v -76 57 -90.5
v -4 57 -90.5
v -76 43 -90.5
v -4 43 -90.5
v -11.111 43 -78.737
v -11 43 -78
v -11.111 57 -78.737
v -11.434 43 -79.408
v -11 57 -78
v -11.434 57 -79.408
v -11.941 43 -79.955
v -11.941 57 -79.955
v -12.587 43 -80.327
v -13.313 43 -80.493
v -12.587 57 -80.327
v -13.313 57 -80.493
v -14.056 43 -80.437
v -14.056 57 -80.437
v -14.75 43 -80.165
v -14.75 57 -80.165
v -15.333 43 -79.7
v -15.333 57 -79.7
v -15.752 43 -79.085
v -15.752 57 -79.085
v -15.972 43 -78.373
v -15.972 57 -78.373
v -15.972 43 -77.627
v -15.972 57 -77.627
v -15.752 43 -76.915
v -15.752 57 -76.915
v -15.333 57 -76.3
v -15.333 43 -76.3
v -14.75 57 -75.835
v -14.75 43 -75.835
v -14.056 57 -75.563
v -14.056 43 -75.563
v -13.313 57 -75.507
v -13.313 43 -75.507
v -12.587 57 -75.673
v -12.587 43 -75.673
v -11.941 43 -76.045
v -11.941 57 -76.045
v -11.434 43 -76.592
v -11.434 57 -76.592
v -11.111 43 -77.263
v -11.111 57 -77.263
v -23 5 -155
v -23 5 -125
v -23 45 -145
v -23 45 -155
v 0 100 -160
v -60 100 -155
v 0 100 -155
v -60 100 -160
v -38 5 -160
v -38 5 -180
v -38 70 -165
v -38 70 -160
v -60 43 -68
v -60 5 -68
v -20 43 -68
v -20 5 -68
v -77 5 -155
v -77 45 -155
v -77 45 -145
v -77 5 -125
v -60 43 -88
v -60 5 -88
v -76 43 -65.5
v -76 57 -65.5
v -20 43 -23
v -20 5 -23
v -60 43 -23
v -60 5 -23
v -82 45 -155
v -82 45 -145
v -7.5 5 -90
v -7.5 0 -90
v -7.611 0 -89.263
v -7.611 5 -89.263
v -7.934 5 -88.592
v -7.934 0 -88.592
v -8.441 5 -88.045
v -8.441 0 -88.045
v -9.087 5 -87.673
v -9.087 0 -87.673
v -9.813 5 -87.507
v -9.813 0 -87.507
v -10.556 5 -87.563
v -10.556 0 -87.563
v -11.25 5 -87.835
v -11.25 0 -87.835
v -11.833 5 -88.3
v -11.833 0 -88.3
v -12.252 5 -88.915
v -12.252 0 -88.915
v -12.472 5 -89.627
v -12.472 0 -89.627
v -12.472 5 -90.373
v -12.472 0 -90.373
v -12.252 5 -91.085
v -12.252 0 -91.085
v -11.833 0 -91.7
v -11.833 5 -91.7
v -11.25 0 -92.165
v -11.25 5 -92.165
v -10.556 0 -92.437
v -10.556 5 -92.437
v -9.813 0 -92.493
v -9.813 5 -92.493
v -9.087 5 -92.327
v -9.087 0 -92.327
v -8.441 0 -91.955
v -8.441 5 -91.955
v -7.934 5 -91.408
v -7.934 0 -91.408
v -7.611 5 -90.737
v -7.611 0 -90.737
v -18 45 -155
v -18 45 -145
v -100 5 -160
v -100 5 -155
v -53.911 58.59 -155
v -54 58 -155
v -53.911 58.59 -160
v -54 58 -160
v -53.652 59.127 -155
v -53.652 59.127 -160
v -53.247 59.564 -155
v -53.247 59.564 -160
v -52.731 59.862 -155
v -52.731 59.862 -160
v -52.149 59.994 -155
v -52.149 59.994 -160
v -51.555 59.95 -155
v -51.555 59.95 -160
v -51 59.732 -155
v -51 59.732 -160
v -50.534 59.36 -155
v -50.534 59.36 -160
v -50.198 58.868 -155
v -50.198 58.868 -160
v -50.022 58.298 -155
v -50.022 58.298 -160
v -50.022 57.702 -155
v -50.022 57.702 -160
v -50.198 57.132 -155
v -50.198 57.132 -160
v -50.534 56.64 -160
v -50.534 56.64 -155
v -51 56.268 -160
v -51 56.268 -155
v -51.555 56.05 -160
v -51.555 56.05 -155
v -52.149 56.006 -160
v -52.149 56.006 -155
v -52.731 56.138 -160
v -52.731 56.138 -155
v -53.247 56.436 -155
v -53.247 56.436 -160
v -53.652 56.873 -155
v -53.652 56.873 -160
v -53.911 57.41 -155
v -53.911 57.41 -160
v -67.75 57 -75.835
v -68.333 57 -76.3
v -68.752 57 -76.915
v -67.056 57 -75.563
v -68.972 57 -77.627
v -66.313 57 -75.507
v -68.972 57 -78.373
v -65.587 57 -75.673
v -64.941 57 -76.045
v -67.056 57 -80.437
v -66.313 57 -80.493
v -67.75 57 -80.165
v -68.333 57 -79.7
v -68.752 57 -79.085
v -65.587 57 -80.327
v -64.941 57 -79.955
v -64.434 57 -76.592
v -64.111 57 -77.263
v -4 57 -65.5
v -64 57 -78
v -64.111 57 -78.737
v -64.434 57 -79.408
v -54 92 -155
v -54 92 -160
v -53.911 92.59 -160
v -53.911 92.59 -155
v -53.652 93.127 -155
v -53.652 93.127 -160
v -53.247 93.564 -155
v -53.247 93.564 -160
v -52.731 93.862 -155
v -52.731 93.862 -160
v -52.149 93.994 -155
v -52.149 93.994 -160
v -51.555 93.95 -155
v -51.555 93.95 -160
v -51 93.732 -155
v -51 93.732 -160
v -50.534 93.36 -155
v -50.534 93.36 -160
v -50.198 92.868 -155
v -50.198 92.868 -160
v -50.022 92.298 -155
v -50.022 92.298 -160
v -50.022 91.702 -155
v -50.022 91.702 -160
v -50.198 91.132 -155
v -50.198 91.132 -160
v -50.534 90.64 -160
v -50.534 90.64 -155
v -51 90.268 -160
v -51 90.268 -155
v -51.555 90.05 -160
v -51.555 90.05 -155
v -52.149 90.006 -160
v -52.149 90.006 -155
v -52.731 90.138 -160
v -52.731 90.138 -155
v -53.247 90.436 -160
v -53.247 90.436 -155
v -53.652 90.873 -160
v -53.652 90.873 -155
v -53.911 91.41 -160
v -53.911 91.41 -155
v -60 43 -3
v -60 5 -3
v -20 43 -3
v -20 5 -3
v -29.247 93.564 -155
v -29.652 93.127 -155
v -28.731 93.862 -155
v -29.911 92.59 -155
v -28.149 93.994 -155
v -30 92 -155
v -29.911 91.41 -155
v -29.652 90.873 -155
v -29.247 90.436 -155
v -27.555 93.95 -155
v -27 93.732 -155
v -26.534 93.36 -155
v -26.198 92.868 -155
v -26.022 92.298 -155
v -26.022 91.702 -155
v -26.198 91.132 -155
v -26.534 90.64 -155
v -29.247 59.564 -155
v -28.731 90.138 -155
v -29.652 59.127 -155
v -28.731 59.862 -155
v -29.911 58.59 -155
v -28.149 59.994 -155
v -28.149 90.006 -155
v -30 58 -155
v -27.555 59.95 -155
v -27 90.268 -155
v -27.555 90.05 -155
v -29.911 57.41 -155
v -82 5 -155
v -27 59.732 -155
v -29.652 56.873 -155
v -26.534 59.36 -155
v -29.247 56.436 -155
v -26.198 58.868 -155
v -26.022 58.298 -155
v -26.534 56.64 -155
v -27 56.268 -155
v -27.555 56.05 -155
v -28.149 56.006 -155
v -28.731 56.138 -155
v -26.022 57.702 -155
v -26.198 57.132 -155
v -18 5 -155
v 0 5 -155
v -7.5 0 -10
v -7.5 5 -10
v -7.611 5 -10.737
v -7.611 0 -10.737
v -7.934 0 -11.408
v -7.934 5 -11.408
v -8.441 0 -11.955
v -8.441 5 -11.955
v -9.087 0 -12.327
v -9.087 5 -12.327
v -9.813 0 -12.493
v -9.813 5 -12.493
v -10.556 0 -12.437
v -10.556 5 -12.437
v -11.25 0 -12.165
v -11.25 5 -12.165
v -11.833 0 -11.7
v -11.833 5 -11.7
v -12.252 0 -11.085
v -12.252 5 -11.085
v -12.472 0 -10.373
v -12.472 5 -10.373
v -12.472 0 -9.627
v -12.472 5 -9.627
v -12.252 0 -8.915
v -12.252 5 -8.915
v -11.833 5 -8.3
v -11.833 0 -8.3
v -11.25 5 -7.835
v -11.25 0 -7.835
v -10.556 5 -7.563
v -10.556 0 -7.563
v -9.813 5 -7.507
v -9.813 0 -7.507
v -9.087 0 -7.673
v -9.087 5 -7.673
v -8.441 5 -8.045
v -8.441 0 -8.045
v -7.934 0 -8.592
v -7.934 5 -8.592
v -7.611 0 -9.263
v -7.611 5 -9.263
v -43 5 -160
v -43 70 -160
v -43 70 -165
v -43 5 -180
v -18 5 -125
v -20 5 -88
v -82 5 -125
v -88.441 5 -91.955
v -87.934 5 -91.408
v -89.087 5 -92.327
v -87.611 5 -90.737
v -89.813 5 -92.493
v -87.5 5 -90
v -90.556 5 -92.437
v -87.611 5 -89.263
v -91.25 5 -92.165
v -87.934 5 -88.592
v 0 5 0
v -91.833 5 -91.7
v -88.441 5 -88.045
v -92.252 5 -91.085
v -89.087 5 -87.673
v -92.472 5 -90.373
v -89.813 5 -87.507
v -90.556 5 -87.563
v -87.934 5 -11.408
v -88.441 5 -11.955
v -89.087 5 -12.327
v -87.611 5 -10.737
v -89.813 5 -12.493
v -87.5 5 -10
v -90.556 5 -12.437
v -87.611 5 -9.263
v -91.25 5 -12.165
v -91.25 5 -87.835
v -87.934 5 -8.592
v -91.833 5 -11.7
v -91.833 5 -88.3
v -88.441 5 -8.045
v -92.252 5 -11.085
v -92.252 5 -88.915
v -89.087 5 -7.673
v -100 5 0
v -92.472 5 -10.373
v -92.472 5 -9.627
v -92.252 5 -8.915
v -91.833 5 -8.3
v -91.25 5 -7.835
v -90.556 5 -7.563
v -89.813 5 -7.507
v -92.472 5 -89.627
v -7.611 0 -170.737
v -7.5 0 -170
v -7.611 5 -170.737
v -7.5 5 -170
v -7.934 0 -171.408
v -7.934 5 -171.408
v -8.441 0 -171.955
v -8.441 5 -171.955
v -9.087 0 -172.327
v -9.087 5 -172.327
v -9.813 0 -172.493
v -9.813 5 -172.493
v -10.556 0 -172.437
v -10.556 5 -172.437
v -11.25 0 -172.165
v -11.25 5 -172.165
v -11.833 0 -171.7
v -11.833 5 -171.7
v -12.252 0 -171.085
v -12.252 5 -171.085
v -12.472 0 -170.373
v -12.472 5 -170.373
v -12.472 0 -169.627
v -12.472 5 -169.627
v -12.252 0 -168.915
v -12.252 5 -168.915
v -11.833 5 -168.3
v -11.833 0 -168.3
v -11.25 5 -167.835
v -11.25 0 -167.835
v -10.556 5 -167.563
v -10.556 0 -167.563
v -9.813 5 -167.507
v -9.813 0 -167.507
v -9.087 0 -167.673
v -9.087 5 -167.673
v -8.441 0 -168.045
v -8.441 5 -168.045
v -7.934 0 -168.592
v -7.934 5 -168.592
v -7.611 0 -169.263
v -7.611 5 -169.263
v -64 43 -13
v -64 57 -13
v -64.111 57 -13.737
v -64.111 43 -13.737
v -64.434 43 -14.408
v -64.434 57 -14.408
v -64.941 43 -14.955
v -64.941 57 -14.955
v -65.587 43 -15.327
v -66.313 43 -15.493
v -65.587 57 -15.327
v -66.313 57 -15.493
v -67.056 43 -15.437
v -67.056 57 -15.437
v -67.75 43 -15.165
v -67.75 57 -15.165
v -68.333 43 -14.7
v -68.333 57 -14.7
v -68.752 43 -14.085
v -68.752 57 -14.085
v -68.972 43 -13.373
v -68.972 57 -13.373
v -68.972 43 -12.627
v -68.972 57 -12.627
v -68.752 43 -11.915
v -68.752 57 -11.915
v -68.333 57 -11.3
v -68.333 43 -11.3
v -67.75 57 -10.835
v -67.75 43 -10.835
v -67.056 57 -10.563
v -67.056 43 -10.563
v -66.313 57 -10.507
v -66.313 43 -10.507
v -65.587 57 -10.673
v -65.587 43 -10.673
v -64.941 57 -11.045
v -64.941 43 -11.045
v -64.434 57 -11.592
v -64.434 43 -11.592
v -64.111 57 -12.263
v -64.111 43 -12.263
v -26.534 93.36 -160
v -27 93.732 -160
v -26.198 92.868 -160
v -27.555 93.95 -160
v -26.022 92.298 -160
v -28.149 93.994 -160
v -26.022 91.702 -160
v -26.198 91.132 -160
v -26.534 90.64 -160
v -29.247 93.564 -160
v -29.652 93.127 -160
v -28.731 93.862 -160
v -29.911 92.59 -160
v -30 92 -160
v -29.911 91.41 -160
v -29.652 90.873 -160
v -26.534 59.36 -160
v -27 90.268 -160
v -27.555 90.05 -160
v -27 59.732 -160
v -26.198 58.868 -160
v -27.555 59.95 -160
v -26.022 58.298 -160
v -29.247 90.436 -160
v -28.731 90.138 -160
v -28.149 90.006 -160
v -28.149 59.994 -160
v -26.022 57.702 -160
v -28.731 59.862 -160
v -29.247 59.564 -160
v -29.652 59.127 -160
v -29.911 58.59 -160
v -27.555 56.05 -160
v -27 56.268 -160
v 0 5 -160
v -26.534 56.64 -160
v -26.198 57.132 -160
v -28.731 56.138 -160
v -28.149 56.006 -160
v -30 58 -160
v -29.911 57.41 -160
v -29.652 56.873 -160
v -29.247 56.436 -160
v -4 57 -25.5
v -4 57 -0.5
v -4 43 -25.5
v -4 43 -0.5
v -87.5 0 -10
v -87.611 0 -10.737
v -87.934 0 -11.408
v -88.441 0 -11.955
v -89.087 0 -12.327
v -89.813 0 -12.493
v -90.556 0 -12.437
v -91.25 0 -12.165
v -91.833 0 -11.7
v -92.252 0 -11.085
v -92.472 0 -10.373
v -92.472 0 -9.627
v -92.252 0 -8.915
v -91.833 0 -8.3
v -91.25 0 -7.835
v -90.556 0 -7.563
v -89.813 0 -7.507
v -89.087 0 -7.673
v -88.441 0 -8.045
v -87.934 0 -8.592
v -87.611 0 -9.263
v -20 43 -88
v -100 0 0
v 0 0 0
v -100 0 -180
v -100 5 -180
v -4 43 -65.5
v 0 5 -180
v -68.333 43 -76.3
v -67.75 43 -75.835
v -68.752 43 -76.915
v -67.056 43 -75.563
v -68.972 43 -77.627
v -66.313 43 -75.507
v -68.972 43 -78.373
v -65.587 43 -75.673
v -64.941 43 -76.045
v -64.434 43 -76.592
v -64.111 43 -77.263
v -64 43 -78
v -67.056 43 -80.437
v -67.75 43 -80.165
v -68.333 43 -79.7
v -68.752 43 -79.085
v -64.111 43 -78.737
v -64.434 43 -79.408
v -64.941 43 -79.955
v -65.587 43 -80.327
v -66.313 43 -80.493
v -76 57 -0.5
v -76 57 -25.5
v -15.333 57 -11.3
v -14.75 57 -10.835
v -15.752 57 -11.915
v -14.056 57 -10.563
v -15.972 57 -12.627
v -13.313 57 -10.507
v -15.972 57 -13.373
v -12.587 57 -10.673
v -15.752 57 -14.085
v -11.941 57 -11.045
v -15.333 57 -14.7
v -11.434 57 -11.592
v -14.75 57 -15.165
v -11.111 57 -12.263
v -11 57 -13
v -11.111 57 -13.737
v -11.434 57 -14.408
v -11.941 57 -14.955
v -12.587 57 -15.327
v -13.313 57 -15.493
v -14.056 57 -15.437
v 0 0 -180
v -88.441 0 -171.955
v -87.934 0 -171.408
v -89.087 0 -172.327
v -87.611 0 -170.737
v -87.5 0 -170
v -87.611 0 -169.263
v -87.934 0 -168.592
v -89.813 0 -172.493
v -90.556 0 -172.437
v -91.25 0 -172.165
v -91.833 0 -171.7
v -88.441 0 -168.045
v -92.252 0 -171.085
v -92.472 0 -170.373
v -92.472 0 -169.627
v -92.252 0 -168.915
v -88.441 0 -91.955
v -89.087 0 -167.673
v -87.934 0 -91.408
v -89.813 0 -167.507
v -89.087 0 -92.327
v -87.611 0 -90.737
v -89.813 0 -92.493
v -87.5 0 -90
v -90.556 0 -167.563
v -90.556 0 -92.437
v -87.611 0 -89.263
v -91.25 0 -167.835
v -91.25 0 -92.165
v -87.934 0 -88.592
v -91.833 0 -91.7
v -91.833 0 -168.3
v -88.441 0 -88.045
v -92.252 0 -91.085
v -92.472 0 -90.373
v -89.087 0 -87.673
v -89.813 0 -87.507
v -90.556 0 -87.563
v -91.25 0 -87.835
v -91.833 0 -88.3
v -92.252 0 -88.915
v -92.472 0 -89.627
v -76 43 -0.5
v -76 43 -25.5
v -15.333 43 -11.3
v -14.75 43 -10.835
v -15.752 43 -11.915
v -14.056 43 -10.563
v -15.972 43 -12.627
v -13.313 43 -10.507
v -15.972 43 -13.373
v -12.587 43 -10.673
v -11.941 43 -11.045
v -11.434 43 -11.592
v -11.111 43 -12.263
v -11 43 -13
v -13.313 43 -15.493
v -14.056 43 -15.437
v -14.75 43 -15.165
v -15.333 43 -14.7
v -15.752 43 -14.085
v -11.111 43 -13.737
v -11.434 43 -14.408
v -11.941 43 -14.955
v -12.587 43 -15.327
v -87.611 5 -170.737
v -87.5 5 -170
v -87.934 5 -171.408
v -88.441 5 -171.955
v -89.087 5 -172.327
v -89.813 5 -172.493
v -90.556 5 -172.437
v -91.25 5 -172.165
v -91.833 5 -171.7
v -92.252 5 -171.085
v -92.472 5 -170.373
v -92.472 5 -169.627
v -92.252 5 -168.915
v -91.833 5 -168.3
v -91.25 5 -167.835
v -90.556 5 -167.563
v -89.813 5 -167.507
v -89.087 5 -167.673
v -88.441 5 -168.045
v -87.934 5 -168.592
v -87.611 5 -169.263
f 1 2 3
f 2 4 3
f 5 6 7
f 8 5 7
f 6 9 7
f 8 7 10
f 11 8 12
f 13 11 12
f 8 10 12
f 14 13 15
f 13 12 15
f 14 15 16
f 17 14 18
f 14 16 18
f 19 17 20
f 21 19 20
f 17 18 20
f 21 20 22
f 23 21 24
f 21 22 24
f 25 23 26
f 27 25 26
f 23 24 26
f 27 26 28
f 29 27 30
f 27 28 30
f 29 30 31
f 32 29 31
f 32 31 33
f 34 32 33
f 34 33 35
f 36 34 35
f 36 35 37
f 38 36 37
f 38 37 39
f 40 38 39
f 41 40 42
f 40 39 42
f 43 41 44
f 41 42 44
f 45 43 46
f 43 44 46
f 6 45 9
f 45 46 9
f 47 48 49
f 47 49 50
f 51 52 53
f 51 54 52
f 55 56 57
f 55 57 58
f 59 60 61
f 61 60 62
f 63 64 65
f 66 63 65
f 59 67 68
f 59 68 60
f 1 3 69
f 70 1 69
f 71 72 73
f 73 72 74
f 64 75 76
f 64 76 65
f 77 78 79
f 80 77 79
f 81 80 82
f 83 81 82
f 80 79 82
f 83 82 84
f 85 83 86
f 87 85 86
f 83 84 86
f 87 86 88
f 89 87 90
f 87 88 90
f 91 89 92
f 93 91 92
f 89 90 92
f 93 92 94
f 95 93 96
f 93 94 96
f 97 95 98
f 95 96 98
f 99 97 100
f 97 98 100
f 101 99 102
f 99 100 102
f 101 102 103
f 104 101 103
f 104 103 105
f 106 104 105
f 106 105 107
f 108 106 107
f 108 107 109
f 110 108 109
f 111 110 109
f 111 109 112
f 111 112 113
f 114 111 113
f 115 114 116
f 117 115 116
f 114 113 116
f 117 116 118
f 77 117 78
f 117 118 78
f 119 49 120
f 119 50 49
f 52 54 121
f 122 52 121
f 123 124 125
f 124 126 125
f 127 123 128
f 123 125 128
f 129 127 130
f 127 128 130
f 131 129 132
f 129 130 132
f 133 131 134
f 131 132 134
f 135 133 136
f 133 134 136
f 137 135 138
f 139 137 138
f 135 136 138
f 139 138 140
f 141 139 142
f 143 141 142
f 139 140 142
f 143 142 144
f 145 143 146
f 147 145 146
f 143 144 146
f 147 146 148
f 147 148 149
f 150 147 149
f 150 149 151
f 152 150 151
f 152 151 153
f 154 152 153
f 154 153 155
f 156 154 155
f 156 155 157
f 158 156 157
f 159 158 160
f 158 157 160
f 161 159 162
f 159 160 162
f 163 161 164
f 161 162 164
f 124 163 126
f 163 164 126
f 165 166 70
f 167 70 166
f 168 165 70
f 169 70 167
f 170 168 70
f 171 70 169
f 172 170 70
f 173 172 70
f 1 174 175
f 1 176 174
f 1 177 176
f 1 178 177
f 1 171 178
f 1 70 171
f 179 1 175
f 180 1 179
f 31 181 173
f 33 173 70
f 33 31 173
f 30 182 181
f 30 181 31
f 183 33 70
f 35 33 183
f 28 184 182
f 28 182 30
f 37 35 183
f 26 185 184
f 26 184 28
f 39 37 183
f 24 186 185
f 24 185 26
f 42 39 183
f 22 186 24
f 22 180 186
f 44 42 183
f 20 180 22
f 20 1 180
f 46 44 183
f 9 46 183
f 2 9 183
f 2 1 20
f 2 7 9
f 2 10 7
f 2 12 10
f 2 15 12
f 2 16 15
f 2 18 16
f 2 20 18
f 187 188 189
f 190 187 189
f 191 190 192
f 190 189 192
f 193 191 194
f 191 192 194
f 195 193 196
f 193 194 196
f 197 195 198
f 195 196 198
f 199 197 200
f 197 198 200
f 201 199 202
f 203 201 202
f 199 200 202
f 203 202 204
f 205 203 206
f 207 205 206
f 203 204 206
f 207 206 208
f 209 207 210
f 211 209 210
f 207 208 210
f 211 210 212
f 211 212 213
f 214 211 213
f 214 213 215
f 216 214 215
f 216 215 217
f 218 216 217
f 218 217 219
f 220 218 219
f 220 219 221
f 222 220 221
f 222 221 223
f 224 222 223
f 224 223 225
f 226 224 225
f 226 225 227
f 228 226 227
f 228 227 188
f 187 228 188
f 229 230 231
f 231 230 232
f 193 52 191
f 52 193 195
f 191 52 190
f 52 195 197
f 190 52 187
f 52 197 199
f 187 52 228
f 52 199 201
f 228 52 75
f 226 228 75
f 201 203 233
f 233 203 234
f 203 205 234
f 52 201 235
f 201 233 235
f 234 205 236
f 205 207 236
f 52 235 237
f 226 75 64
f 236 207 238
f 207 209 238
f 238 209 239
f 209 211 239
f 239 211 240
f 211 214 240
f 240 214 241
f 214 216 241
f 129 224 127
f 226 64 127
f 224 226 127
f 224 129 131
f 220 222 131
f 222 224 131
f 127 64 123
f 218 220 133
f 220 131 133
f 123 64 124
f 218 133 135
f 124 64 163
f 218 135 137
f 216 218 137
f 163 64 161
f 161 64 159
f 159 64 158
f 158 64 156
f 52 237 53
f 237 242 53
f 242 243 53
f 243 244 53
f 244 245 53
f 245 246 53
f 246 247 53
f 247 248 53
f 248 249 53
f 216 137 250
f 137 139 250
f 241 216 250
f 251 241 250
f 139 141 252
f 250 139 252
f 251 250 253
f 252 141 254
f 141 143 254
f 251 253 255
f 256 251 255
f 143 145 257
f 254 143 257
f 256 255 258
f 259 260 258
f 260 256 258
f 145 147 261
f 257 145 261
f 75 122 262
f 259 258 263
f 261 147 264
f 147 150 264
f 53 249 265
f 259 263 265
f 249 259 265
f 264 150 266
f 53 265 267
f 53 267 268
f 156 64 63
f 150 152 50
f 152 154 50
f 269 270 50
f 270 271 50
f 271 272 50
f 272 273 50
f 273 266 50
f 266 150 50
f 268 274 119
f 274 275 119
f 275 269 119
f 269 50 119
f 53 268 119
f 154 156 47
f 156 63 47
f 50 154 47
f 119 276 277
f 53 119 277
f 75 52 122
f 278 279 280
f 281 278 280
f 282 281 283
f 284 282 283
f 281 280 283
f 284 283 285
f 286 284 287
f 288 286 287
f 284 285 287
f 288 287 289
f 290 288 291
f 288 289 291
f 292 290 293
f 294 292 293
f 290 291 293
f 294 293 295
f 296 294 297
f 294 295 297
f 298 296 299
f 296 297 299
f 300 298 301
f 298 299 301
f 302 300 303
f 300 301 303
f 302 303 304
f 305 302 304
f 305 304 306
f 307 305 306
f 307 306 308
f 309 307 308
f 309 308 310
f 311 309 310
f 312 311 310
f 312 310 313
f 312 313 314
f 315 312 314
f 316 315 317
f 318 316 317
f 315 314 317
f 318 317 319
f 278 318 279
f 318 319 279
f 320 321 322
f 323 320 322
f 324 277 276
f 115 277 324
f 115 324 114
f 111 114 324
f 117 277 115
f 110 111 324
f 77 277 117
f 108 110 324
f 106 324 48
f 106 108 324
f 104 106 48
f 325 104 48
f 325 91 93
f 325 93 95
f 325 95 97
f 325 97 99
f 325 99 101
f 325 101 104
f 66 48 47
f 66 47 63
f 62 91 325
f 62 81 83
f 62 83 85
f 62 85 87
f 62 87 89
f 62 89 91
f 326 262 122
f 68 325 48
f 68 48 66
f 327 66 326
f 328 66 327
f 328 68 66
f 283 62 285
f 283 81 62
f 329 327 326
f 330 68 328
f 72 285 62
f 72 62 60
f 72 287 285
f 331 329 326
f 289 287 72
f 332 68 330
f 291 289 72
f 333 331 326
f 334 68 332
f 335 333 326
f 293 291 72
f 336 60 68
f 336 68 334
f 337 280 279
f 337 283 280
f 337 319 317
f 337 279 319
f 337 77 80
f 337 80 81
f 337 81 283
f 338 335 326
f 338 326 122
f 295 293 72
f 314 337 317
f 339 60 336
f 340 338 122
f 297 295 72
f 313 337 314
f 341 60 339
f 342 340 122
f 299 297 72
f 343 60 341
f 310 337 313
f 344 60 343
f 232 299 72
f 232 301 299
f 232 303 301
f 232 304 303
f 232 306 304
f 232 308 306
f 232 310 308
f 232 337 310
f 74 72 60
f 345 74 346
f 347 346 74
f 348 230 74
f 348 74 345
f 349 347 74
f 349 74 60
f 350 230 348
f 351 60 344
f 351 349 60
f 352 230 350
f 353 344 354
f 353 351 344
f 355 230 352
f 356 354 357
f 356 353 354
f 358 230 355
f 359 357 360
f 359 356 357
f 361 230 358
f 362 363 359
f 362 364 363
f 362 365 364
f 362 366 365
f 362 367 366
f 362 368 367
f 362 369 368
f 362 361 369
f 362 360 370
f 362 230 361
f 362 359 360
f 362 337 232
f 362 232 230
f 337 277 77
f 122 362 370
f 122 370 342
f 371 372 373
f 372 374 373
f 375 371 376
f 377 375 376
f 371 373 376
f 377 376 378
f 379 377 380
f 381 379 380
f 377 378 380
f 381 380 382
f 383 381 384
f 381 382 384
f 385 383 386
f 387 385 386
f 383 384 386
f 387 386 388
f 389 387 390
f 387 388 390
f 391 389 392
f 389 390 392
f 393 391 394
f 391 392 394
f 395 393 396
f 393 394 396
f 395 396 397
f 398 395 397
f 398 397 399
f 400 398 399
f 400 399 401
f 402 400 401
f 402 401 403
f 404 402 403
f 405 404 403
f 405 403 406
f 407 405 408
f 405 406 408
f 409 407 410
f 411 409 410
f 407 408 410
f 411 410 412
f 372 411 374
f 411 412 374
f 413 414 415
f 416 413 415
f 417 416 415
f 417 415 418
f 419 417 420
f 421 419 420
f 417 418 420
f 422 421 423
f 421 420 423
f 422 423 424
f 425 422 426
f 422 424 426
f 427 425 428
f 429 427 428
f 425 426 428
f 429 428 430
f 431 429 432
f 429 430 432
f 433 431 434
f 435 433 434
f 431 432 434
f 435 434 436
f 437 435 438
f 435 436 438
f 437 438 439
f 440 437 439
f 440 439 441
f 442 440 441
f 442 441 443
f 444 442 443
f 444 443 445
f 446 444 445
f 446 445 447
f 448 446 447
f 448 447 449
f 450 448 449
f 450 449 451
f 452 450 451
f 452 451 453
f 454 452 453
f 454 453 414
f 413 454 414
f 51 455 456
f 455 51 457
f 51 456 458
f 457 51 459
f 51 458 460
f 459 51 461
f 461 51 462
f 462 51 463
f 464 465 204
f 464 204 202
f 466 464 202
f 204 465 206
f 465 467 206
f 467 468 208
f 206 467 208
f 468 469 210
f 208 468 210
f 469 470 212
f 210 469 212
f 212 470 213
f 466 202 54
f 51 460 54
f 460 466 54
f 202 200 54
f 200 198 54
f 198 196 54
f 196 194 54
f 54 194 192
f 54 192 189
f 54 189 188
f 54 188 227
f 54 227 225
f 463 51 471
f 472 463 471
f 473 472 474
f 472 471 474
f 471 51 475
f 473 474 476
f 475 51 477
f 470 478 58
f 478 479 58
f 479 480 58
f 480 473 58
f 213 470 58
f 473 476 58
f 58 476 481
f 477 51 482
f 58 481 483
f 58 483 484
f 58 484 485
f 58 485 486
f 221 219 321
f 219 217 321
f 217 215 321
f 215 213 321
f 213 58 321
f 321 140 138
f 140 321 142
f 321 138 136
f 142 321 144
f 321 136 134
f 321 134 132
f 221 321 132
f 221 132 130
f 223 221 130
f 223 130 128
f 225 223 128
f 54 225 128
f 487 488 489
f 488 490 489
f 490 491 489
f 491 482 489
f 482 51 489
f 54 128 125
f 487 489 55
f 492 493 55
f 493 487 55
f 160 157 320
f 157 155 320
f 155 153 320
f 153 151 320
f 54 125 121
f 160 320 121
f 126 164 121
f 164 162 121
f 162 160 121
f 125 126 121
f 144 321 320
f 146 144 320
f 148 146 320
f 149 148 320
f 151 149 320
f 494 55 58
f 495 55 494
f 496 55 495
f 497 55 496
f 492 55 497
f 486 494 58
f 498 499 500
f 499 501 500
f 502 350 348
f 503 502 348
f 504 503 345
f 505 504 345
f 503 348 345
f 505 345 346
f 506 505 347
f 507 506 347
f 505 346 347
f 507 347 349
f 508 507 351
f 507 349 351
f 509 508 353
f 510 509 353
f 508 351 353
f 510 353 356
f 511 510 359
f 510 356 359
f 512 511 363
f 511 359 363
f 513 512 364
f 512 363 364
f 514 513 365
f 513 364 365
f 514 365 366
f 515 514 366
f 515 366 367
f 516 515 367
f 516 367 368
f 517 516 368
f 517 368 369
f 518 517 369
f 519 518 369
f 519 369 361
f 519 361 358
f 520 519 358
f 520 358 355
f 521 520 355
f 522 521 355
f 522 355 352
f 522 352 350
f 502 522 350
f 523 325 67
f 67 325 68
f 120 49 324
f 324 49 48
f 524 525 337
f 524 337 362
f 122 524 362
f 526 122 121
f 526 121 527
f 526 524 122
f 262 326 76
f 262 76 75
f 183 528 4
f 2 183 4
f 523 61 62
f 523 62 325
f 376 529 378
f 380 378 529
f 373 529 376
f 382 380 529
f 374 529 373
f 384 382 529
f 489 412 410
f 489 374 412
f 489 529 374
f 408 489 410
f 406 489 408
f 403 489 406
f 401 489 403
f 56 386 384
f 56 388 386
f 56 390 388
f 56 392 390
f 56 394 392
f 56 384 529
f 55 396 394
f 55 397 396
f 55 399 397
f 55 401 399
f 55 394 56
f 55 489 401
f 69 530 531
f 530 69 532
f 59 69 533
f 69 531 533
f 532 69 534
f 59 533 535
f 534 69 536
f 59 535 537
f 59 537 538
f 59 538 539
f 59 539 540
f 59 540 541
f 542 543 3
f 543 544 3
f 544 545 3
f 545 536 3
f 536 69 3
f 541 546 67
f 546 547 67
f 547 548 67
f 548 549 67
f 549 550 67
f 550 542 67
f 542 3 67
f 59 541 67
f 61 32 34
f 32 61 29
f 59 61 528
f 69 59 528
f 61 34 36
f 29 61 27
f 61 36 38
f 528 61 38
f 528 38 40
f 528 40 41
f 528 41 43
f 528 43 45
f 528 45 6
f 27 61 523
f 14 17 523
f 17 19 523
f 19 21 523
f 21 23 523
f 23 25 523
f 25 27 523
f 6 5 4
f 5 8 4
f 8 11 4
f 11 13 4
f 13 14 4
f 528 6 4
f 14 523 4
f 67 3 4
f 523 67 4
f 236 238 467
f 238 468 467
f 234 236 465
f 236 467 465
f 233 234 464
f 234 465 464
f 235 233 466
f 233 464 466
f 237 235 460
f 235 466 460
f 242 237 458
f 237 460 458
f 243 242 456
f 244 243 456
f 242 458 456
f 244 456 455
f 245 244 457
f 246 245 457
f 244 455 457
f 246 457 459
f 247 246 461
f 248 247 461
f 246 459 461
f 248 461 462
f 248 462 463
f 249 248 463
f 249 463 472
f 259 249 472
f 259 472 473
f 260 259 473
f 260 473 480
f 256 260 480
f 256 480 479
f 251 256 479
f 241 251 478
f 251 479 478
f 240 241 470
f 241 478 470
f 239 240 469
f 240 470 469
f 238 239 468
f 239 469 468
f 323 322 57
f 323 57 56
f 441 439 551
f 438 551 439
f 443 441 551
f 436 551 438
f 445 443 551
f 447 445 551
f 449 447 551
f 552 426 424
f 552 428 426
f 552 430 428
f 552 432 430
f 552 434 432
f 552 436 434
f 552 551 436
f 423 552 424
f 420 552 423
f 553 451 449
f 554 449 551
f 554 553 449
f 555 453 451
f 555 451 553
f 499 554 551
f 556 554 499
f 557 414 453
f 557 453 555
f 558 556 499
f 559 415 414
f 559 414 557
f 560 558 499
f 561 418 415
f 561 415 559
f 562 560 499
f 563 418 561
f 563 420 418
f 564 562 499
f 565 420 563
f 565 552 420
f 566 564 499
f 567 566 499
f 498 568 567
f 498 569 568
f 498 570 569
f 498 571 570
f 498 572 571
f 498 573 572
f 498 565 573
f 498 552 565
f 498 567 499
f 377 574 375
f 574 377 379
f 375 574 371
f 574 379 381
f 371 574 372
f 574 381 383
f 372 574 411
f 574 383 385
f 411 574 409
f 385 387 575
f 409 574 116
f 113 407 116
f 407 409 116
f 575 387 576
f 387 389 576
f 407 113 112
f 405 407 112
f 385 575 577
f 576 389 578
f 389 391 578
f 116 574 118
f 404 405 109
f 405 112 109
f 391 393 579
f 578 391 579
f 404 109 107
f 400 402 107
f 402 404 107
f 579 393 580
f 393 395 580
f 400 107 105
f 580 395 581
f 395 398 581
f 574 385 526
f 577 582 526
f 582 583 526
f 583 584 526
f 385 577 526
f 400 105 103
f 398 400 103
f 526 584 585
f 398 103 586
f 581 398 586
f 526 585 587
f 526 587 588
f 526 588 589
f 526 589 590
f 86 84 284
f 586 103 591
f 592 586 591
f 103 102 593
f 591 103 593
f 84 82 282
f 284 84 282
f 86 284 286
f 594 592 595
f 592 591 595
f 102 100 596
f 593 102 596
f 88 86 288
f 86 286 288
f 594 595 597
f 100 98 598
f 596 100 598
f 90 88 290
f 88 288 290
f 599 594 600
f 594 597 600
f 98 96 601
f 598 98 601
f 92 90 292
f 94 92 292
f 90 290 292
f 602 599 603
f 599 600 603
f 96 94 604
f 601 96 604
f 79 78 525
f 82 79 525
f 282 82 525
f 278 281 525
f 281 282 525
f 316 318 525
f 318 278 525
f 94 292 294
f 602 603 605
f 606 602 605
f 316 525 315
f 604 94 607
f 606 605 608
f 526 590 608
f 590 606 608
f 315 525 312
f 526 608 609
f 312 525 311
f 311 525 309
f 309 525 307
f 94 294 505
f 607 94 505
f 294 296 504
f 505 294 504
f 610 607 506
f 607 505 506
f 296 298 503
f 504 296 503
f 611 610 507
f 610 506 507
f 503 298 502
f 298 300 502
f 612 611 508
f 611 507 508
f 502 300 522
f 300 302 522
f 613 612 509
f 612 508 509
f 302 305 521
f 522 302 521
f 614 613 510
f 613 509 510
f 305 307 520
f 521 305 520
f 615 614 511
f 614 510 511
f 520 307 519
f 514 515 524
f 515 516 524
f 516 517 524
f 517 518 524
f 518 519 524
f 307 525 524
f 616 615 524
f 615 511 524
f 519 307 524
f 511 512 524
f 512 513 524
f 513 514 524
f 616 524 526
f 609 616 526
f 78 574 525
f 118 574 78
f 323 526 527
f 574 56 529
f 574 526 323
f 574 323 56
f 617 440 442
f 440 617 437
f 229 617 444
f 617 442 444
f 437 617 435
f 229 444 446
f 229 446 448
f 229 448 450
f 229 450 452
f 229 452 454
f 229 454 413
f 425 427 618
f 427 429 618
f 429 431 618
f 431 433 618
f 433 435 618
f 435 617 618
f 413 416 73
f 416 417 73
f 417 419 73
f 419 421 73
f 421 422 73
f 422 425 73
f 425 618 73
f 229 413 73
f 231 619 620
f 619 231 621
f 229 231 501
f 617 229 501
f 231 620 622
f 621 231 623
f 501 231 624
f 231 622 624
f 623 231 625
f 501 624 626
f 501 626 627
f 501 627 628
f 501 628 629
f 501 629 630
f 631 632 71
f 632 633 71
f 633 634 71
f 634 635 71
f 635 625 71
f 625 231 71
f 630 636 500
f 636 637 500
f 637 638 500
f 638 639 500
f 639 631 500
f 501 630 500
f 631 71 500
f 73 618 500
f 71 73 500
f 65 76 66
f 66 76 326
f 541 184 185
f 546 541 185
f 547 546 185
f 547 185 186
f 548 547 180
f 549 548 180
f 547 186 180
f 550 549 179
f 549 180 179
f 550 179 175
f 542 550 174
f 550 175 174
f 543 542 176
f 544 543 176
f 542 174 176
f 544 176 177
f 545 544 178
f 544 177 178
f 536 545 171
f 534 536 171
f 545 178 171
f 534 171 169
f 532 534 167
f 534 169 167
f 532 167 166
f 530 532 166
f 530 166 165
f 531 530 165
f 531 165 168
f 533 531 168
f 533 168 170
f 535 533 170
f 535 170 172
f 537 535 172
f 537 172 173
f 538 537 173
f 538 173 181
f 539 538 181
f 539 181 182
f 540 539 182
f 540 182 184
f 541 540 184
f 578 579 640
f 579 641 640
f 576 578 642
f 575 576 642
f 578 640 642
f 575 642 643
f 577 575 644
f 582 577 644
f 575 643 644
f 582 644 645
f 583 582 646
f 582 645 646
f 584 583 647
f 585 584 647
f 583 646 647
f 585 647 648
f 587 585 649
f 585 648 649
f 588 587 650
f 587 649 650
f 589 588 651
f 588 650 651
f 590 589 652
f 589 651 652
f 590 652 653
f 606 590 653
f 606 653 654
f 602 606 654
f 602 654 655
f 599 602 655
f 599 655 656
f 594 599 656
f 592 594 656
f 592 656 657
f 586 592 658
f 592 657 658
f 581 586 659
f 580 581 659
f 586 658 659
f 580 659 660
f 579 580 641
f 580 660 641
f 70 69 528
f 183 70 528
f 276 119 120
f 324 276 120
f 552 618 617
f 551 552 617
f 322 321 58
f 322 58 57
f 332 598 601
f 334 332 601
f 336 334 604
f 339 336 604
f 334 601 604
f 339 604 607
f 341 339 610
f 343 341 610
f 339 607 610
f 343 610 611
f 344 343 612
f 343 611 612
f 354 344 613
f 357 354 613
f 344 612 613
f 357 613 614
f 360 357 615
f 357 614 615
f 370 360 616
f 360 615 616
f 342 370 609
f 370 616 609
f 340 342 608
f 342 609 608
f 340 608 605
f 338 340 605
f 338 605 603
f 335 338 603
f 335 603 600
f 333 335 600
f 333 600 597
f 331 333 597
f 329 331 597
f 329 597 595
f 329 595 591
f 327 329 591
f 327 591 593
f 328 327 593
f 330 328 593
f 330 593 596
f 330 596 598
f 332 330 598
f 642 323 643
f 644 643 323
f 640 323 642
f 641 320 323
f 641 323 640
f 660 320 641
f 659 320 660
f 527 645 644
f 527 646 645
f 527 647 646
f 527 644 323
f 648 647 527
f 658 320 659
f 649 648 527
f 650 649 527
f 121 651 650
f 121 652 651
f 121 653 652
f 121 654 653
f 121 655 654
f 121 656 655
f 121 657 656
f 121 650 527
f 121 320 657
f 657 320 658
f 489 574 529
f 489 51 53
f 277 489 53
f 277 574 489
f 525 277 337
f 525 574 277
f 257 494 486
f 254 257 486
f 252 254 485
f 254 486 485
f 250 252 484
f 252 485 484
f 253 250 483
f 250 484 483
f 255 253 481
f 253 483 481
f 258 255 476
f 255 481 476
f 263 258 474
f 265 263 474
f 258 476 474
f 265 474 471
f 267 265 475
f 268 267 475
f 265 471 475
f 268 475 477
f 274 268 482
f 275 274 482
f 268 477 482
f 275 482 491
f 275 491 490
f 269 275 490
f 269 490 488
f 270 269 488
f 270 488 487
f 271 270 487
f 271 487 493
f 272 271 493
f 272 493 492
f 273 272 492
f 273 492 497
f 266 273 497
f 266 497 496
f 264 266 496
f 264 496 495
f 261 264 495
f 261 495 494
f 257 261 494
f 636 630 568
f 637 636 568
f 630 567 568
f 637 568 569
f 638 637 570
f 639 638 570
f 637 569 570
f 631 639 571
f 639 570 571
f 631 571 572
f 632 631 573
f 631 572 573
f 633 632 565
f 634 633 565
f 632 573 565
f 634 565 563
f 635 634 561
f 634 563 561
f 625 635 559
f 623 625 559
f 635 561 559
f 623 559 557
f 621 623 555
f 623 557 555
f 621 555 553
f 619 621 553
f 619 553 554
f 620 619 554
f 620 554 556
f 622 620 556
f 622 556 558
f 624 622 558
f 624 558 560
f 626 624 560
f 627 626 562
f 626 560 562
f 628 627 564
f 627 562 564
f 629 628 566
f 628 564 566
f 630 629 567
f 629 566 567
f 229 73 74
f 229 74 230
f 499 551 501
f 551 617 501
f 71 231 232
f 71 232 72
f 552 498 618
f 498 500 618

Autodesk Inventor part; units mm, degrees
ref_plane "YZ Plane" through (0, 0, 0) normal (1, 0, 0) x (0, 1, 0)
ref_plane "XZ Plane" through (0, 0, 0) normal (0, 1, 0) x (-1, 0, 0)
ref_plane "XY Plane" through (0, 0, 0) normal (0, 0, 1) x (1, 0, 0)
sketch "Sketch1" plane through (0, 0, 0) normal (0, 1, 0) x (-1, 0, 0)
  line L0 (0, 0) -> (100, 0)
  line L1 (100, 0) -> (100, -180)
  line L2 (100, -180) -> (0, -180)
  line L3 (0, -180) -> (0, 0)
  dimension "d0" = 100
  dimension "d1" = 180
extrude "Extrusion1" add sketch "Sketch1" along normal blind 5
sketch "Sketch2" plane through (0, 5, 0) normal (0, 1, 0) x (1, 0, 0)
  line L0 (0, 160) -> (-100, 160)
  line L1 (-100, 160) -> (-100, 155)
  line L2 (-100, 155) -> (0, 155)
  line L3 (0, 155) -> (0, 160)
  line L4 (0, 180) -> (-100, 180) projected
  point P0 (0, 0)
  dimension "d4" = 100
  dimension "d5" = 5
  dimension "d6" = 20
extrude "Extrusion2" add sketch "Sketch2" along normal blind 95
sketch "Sketch5" plane through (0, 5, -160) normal (0, 0, -1) x (-1, 0, 0)
  line L0 (28, 87) -> (52, 87)
  line L1 (52, 87) -> (52, 53)
  line L2 (52, 53) -> (28, 53)
  line L3 (28, 53) -> (28, 87)
  line L4 (28, 87) -> (52, 53) construction
  line L5 (52, 87) -> (28, 53) construction
  line L6 (0, 0) -> (0, 95) projected
  line L7 (0, 95) -> (100, 95) projected
  circle A0 centre (28, 87) radius 2
  circle A1 centre (52, 87) radius 2
  circle A2 centre (28, 53) radius 2
  circle A3 centre (52, 53) radius 2
  point P0 (0, -5)
  point P1 (40, 70)
  point P2 (50, 95)
  dimension "d14" = 24
  dimension "d15" = 34
  dimension "d16" = 40
  dimension "d17" = 25
  dimension "d19" = 4
  dimension "d20" = 4
  dimension "d21" = 4
  dimension "d22" = 4
extrude "Extrusion4" cut sketch "Sketch5" against normal blind 95 contours L3 A0 L0 | L0 A0 L3 | A1 L1 L0 | L0 L1 A1 | A2 L2 L3 | L3 L2 A2 | A3 L2 L1 | L1 L2 A3
sketch "Sketch12" plane through (0, 5, -160) normal (0, 0, -1) x (-1, 0, 0)
  line L0 (0, 95) -> (100, 95) projected
  line L1 (100, 95) -> (60, 95)
  line L2 (100, 0) -> (0, 0) projected
  line L3 (60, 95) -> (100, 0)
  line L4 (100, 0) -> (100, 95)
  point P0 (0, -5)
  dimension "d72" = 40
extrude "Extrusion10" cut sketch "Sketch12" against normal blind 14
sketch "Sketch13" plane through (0, 5, 0) normal (0, 1, 0) x (1, 0, 0)
  line L0 (-20, 23) -> (-60, 23)
  line L1 (-60, 23) -> (-60, 3)
  line L2 (-60, 3) -> (-20, 3)
  line L3 (-20, 3) -> (-20, 23)
  line L4 (-20, 23) -> (-60, 3) construction
  line L5 (-60, 23) -> (-20, 3) construction
  line L6 (-100, 0) -> (0, 0) projected
  line L7 (0, 0) -> (0, 155) projected
  line L8 (-20, 88) -> (-60, 88)
  line L9 (-60, 88) -> (-60, 68)
  line L10 (-60, 68) -> (-20, 68)
  line L11 (-20, 68) -> (-20, 88)
  line L12 (-20, 88) -> (-60, 68) construction
  line L13 (-60, 88) -> (-20, 68) construction
  point P0 (-40, 13)
  point P1 (-40, 78)
  dimension "d76" = 40
  dimension "d77" = 20
  dimension "d78" = 3
  dimension "d79" = 40
  dimension "d80" = 40
  dimension "d81" = 20
  dimension "d82" = 45
  dimension "d83" = 40
extrude "Extrusion11" add sketch "Sketch13" along normal blind 38
sketch "Sketch14" plane through (0, 43, 0) normal (0, 1, 0) x (1, 0, 0)
  line L0 (-4, 90.5) -> (-76, 90.5)
  line L1 (-76, 90.5) -> (-76, 65.5)
  line L2 (-76, 65.5) -> (-4, 65.5)
  line L3 (-4, 65.5) -> (-4, 90.5)
  line L4 (-4, 90.5) -> (-76, 65.5) construction
  line L5 (-76, 90.5) -> (-4, 65.5) construction
  line L6 (-20, 88) -> (-60, 88) projected
  line L7 (-20, 68) -> (-20, 88) projected
  line L8 (-4, 25.5) -> (-76, 25.5)
  line L9 (-76, 25.5) -> (-76, 0.5)
  line L10 (-76, 0.5) -> (-4, 0.5)
  line L11 (-4, 0.5) -> (-4, 25.5)
  line L12 (-4, 25.5) -> (-76, 0.5) construction
  line L13 (-76, 25.5) -> (-4, 0.5) construction
  line L14 (-20, 23) -> (-60, 23) projected
  line L15 (-20, 3) -> (-20, 23) projected
  point P0 (0, 0)
  point P1 (-40, 78)
  point P2 (-40, 13)
  dimension "d86" = 72
  dimension "d87" = 25
  dimension "d88" = 10
  dimension "d89" = 20
  dimension "d90" = 72
  dimension "d91" = 25
  dimension "d92" = 10
  dimension "d93" = 20
extrude "Extrusion12" add sketch "Sketch14" along normal blind 14
sketch "Sketch16" plane through (0, 5, 0) normal (0, 1, 0) x (1, 0, 0)
  line L0 (0, 180) -> (-100, 180) projected
  line L1 (-38, 160) -> (-43, 160)
  line L2 (-43, 160) -> (-43, 180)
  line L3 (-43, 180) -> (-38, 180)
  line L4 (-38, 180) -> (-38, 160)
  line L5 (0, 160) -> (0, 180) projected
  point P0 (0, 0)
  dimension "d96" = 20
  dimension "d97" = 38
  dimension "d98" = 5
extrude "Extrusion13" add sketch "Sketch16" along normal blind 95
sketch "Sketch18" plane through (0, 5, 0) normal (0, 1, 0) x (1, 0, 0)
  line L0 (-60, 155) -> (-100, 155) projected
  line L1 (-82, 155) -> (-77, 155)
  line L2 (-77, 155) -> (-77, 125)
  line L3 (-77, 125) -> (-82, 125)
  line L4 (-82, 125) -> (-82, 155)
  line L5 (-23, 155) -> (-18, 155)
  line L6 (-18, 155) -> (-18, 125)
  line L7 (-18, 125) -> (-23, 125)
  line L8 (-23, 125) -> (-23, 155)
  line L9 (-100, 155) -> (-100, 0) projected
  line L10 (0, 0) -> (0, 155) projected
  dimension "d103" = 5
  dimension "d104" = 30
  dimension "d105" = 5
  dimension "d106" = 30
  dimension "d107" = 18
  dimension "d108" = 18
extrude "Extrusion15" add sketch "Sketch18" along normal blind 40
sketch "Sketch20" plane through (-43, 5, -180) normal (-1, 0, 0) x (0, 0, 1)
  line L0 (20, 0) -> (20, 95) projected
  line L1 (20, 95) -> (20, 65)
  line L2 (20, 65) -> (15, 65)
  line L3 (0, 0) -> (20, 0) projected
  line L4 (15, 65) -> (0, 0)
  line L5 (0, 95) -> (20, 95) projected
  line L6 (0, 0) -> (0, 95)
  line L7 (0, 95) -> (20, 95)
  point P0 (180, -5)
  dimension "d114" = 30
  dimension "d115" = 5
extrude "Extrusion17" cut sketch "Sketch20" against normal blind 10 contours L2 L4 L6 L5 L0
sketch "Sketch21" plane through (0, 5, 0) normal (0, 1, 0) x (1, 0, 0)
  circle A0 centre (-90, 10) radius 2.5
  line L0 (-100, 155) -> (-100, 0) projected
  line L1 (-100, 0) -> (0, 0) projected
  circle A1 centre (-10, 10) radius 2.5
  line L2 (0, 0) -> (0, 155) projected
  circle A2 centre (-90, 170) radius 2.5
  line L3 (-43, 180) -> (-100, 180) projected
  line L4 (-100, 180) -> (-100, 160) projected
  circle A3 centre (-10, 170) radius 2.5
  line L5 (0, 180) -> (-38, 180) projected
  line L6 (0, 160) -> (0, 180) projected
  circle A4 centre (-50, 50) radius 2.5
  circle A5 centre (-50, 130) radius 2.5
  dimension "d118" = 5
  dimension "d119" = 10
  dimension "d120" = 10
  dimension "d121" = 5
  dimension "d122" = 10
  dimension "d123" = 10
  dimension "d124" = 5
  dimension "d125" = 10
  dimension "d126" = 10
  dimension "d127" = 5
  dimension "d128" = 10
  dimension "d129" = 10
  dimension "d130" = 5
  dimension "d131" = 5
  dimension "d132" = 50
  dimension "d133" = 50
extrude "Extrusion18" cut sketch "Sketch21" against normal blind 10
sketch "Sketch27" plane through (0, 57, 0) normal (0, 1, 0) x (1, 0, 0)
  circle A0 centre (-66.5, 78) radius 2.5
  line L0 (-4, 90.5) -> (-76, 90.5) projected
  line L1 (-76, 90.5) -> (-76, 65.5) projected
  circle A1 centre (-13.5, 78) radius 2.5
  line L2 (-76, 65.5) -> (-4, 65.5) projected
  circle A2 centre (-66.5, 13) radius 2.5
  line L3 (-76, 25.5) -> (-76, 0.5) projected
  line L4 (-76, 0.5) -> (-4, 0.5) projected
  circle A3 centre (-13.5, 13) radius 2.5
  line L5 (-4, 0.5) -> (-4, 25.5) projected
  point P0 (0, 0)
  dimension "d137" = 5
  dimension "d138" = 12.5
  dimension "d139" = 9.5
  dimension "d140" = 5
  dimension "d141" = 53
  dimension "d142" = 12.5
  dimension "d143" = 5
  dimension "d144" = 9.5
  dimension "d145" = 12.5
  dimension "d146" = 5
  dimension "d147" = 9.5
  dimension "d148" = 12.5
extrude "Extrusion19" cut sketch "Sketch27" against normal blind 15
sketch "Sketch28" plane through (-82, 5, -155) normal (-1, 0, 0) x (0, 0, 1)
  line L0 (0, 40) -> (30, 40) projected
  line L1 (30, 40) -> (10, 40)
  line L2 (30, 0) -> (30, 40) projected
  line L3 (10, 40) -> (30, 0)
  line L4 (30, 0) -> (30, 40)
  point P0 (155, -5)
  dimension "d151" = 20
extrude "Extrusion20" cut sketch "Sketch28" against normal blind 200
sketch "Sketch29" plane through (0, 0, 0) normal (0, -1, 0) x (1, 0, 0)
  circle A0 centre (-90, -90) radius 2.5
  line L0 (-100, 0) -> (-100, -180) projected
  line L1 (0, 0) -> (-100, 0) projected
  circle A1 centre (-10, -90) radius 2.5
  line L2 (0, -180) -> (0, 0) projected
  dimension "d154" = 5
  dimension "d155" = 10
  dimension "d156" = 90
  dimension "d157" = 5
  dimension "d158" = 10
  dimension "d159" = 90
extrude "Extrusion21" cut sketch "Sketch29" against normal blind 5
sketch "Sketch30" plane through (0, 0, 0) normal (0, -1, 0) x (1, 0, 0)
  circle A0 centre (-50, -130) radius 2.5 projected
  circle A1 centre (-50, -130) radius 2.5
  circle A2 centre (-50, -50) radius 2.5 projected
  circle A3 centre (-50, -50) radius 2.5
  point P0 (0, 0)
  dimension "d162" = 5
  dimension "d163" = 5
extrude "Extrusion22" add sketch "Sketch30" against normal blind 5
properties part number "Giá đỡ động cơ"
